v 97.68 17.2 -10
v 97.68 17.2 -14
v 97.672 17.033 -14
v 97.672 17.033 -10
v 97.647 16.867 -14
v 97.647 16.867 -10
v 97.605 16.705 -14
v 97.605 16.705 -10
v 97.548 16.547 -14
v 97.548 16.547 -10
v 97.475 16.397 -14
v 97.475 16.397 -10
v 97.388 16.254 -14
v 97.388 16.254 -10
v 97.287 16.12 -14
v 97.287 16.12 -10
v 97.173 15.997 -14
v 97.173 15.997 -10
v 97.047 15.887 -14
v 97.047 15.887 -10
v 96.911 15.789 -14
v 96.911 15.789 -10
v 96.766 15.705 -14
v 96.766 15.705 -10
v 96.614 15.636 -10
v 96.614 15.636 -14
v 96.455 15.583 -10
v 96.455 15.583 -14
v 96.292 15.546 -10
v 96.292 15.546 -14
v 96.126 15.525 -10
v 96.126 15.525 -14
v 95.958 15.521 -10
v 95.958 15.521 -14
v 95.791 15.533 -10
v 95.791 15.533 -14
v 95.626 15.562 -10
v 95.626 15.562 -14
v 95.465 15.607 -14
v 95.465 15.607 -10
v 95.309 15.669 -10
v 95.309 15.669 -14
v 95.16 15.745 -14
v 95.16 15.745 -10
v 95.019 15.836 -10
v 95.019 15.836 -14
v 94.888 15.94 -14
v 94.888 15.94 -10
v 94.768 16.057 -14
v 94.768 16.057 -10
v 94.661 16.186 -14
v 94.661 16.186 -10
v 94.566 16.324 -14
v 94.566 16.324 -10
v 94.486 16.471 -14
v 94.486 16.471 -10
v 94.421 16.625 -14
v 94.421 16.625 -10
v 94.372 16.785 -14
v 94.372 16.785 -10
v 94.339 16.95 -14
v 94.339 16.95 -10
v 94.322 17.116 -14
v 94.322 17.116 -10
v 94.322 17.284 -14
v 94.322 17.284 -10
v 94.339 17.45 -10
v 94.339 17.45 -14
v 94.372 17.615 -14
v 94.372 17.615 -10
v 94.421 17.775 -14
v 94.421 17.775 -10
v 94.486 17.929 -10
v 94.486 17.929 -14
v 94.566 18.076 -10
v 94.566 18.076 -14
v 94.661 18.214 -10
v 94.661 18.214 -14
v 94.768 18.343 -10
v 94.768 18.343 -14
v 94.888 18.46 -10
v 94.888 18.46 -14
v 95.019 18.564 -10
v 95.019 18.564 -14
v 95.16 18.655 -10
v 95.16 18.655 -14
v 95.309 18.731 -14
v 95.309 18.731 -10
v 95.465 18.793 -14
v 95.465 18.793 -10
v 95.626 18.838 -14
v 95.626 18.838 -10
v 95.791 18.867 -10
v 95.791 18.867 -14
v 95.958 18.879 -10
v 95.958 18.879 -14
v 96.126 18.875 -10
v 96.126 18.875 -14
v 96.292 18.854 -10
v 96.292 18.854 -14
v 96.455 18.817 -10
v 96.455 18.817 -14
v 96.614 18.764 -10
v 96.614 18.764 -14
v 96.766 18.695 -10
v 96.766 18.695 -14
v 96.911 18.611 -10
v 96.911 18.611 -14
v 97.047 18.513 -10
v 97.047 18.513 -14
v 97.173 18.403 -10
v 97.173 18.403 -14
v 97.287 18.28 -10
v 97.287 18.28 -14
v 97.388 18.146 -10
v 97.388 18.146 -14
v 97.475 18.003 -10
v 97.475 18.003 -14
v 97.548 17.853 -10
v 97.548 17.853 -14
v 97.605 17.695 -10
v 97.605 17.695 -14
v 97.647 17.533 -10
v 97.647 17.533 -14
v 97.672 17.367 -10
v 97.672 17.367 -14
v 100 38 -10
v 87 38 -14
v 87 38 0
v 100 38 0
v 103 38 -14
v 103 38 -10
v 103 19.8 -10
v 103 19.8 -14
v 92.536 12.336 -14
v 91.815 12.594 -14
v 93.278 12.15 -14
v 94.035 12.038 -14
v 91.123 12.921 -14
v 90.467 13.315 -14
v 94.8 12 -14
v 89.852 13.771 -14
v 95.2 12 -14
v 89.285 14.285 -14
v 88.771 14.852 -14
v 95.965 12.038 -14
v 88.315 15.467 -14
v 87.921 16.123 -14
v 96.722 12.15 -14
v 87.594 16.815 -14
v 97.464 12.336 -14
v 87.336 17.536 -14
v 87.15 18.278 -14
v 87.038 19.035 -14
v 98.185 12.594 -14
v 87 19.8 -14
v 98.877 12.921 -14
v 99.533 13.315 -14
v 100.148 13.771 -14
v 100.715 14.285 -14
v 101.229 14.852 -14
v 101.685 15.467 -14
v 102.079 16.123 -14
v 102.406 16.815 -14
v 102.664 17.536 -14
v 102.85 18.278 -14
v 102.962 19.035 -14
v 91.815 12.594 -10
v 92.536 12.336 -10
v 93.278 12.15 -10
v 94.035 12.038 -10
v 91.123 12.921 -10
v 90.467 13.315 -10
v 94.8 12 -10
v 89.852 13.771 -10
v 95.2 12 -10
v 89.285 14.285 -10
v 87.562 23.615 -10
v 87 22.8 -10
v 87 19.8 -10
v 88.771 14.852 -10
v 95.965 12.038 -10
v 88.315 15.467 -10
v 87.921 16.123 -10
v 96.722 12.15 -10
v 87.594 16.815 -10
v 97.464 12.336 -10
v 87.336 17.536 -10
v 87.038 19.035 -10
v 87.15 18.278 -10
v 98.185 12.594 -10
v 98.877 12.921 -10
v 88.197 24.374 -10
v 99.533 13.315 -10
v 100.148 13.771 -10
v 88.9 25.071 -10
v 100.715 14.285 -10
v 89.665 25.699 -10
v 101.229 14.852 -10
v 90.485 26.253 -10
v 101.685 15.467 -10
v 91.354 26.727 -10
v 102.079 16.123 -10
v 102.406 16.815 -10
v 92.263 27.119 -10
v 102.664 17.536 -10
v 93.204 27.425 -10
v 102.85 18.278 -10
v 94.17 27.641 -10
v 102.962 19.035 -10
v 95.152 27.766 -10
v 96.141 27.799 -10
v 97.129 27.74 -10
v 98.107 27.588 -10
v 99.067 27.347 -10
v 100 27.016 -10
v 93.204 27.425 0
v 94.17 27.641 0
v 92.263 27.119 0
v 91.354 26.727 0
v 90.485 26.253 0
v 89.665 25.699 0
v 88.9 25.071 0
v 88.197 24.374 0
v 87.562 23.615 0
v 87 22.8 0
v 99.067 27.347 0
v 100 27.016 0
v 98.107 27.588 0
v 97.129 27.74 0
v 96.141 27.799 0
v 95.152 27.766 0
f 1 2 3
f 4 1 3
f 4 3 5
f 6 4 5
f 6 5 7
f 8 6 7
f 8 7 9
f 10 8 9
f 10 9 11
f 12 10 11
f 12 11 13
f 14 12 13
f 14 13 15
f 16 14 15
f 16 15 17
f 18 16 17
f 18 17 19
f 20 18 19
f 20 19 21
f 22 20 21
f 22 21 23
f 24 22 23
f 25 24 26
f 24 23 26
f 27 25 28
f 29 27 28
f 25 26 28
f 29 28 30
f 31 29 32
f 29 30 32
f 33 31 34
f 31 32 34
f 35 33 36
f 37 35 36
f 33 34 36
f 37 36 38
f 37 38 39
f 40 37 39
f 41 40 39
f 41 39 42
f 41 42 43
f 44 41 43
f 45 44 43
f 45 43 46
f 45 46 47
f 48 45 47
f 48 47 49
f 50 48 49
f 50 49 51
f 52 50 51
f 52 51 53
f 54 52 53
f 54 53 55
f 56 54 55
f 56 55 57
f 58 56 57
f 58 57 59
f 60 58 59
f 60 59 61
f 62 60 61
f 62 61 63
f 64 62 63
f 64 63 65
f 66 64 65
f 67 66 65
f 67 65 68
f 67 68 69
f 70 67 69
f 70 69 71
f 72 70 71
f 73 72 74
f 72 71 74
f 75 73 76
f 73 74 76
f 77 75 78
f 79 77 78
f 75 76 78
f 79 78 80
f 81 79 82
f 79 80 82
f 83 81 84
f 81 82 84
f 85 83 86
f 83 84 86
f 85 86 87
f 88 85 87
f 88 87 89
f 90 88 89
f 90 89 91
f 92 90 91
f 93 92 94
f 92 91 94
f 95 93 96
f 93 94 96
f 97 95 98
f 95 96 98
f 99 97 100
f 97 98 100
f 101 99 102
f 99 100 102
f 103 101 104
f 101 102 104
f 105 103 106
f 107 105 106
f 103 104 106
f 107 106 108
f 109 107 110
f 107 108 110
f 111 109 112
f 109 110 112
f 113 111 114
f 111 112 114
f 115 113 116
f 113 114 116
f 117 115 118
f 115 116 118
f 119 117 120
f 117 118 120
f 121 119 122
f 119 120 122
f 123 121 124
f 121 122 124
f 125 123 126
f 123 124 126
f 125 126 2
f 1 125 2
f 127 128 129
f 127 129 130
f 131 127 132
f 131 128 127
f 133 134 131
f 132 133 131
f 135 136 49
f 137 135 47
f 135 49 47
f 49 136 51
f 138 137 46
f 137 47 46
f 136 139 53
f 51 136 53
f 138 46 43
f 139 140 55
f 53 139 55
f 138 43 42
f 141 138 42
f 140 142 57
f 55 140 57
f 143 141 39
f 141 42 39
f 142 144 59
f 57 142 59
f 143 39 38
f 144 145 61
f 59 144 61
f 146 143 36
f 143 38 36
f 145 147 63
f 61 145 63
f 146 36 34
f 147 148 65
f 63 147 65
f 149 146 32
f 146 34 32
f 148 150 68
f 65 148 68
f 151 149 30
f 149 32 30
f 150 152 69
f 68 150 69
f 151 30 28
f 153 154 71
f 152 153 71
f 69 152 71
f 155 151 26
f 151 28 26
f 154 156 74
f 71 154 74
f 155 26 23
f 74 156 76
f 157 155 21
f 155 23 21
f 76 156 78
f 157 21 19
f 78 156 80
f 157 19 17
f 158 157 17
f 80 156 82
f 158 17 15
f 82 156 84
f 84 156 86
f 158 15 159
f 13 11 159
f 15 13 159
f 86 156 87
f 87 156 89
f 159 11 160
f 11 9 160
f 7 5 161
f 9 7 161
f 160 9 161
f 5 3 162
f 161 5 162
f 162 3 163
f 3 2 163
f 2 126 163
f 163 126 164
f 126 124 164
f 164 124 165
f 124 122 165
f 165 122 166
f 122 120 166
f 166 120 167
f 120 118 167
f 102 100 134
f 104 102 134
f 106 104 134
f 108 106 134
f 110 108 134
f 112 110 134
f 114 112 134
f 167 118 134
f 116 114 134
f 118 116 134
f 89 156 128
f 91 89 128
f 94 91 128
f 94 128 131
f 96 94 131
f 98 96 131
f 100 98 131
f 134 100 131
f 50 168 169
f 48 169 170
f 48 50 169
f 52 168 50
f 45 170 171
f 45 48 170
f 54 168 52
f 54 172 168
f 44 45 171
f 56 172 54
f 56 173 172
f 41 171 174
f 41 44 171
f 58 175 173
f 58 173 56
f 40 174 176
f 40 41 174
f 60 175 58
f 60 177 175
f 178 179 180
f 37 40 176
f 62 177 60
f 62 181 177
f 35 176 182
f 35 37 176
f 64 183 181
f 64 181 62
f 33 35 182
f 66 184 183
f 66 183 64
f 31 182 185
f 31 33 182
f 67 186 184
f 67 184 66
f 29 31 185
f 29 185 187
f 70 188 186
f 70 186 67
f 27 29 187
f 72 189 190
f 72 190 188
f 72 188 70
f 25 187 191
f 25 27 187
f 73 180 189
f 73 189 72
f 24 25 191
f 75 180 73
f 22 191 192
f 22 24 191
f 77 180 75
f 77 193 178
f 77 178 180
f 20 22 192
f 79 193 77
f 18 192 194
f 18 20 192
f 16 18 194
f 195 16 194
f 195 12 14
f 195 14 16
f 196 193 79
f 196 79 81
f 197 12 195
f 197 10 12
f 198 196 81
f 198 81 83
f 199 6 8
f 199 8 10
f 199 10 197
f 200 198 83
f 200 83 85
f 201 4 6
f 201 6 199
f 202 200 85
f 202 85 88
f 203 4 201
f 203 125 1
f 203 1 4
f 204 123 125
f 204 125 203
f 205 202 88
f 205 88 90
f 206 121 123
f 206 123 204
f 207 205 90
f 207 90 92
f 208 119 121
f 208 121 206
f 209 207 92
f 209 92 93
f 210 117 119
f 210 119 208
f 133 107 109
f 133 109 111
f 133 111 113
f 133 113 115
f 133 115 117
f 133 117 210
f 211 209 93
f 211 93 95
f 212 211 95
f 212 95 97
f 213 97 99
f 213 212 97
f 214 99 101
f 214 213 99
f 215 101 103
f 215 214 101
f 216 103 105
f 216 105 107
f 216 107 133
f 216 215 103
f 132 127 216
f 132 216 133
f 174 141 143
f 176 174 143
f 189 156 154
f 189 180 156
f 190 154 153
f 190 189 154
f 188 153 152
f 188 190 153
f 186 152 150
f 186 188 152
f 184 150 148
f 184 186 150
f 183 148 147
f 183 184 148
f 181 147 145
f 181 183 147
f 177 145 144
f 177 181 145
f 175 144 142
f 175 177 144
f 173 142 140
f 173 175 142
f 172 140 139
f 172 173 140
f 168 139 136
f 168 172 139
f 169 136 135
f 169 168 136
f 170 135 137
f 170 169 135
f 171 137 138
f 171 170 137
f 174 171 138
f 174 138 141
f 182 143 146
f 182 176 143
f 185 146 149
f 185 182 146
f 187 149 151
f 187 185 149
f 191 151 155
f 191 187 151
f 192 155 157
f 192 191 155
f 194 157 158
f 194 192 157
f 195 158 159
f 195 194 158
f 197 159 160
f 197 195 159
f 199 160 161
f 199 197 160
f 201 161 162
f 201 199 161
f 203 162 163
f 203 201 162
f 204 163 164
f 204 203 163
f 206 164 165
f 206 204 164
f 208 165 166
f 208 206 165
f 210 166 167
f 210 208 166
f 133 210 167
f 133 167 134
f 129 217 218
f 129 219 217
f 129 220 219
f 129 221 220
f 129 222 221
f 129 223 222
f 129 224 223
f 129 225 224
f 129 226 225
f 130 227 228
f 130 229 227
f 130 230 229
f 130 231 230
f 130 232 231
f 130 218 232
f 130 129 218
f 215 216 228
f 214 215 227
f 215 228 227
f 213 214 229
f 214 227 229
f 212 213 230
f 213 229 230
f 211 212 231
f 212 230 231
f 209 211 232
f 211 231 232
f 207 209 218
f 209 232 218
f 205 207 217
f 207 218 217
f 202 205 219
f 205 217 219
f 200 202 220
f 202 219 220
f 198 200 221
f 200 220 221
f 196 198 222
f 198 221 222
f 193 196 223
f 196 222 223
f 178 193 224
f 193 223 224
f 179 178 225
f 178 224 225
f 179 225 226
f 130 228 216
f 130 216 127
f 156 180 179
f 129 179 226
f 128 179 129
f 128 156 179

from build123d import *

# Parameters (mm, degrees)
BOX004_W        = 16
BOX004_H        = 26
BOX004_DEPTH    = 14
SKETCH023_R     = 1.68
POCKET014_DEPTH = 19
SKETCH022_R     = 10.6
POCKET015_DEPTH = 10
SKETCH024_W     = 13
SKETCH024_H     = 10
POCKET016_DEPTH = 3
FILLET007_R     = 7.8


with BuildPart() as part:
    # Box004 → Box004 (new body)
    with BuildSketch(Plane(origin=(87, 12, -14), x_dir=(1, 0, 0), z_dir=(0, 0, 1))):
        with Locations((8, 13)):
            Rectangle(BOX004_W, BOX004_H)
    extrude(amount=BOX004_DEPTH)

    # Sketch023 → Pocket014 (cut)
    with BuildSketch(Plane(origin=(87, 12, -14), x_dir=(1, 0, 0), z_dir=(0, 0, -1))):
        with Locations((9, -5.2)):
            Circle(SKETCH023_R)
    extrude(amount=-POCKET014_DEPTH, mode=Mode.SUBTRACT)

    # Sketch022 → Pocket015 (cut)
    with BuildSketch(Plane(origin=(87, 12, 0), x_dir=(1, 0, 0), z_dir=(0, 0, 1))):
        with Locations((9, 5.2)):
            Circle(SKETCH022_R)
    extrude(amount=-POCKET015_DEPTH, mode=Mode.SUBTRACT)

    # Sketch024 → Pocket016 (cut)
    with BuildSketch(Plane(origin=(103, 12, -14), x_dir=(0, 1, 0), z_dir=(1, 0, 0))):
        with Locations((19.5, 9)):
            Rectangle(SKETCH024_W, SKETCH024_H)
    extrude(amount=-POCKET016_DEPTH, mode=Mode.SUBTRACT)

    # Fillet007
    fillet007_edges = [part.edges().sort_by_distance(p)[0] for p in [
        (87, 12, -12),
        (103, 12, -12),
    ]]
    fillet(fillet007_edges, radius=FILLET007_R)


solid = part.part
